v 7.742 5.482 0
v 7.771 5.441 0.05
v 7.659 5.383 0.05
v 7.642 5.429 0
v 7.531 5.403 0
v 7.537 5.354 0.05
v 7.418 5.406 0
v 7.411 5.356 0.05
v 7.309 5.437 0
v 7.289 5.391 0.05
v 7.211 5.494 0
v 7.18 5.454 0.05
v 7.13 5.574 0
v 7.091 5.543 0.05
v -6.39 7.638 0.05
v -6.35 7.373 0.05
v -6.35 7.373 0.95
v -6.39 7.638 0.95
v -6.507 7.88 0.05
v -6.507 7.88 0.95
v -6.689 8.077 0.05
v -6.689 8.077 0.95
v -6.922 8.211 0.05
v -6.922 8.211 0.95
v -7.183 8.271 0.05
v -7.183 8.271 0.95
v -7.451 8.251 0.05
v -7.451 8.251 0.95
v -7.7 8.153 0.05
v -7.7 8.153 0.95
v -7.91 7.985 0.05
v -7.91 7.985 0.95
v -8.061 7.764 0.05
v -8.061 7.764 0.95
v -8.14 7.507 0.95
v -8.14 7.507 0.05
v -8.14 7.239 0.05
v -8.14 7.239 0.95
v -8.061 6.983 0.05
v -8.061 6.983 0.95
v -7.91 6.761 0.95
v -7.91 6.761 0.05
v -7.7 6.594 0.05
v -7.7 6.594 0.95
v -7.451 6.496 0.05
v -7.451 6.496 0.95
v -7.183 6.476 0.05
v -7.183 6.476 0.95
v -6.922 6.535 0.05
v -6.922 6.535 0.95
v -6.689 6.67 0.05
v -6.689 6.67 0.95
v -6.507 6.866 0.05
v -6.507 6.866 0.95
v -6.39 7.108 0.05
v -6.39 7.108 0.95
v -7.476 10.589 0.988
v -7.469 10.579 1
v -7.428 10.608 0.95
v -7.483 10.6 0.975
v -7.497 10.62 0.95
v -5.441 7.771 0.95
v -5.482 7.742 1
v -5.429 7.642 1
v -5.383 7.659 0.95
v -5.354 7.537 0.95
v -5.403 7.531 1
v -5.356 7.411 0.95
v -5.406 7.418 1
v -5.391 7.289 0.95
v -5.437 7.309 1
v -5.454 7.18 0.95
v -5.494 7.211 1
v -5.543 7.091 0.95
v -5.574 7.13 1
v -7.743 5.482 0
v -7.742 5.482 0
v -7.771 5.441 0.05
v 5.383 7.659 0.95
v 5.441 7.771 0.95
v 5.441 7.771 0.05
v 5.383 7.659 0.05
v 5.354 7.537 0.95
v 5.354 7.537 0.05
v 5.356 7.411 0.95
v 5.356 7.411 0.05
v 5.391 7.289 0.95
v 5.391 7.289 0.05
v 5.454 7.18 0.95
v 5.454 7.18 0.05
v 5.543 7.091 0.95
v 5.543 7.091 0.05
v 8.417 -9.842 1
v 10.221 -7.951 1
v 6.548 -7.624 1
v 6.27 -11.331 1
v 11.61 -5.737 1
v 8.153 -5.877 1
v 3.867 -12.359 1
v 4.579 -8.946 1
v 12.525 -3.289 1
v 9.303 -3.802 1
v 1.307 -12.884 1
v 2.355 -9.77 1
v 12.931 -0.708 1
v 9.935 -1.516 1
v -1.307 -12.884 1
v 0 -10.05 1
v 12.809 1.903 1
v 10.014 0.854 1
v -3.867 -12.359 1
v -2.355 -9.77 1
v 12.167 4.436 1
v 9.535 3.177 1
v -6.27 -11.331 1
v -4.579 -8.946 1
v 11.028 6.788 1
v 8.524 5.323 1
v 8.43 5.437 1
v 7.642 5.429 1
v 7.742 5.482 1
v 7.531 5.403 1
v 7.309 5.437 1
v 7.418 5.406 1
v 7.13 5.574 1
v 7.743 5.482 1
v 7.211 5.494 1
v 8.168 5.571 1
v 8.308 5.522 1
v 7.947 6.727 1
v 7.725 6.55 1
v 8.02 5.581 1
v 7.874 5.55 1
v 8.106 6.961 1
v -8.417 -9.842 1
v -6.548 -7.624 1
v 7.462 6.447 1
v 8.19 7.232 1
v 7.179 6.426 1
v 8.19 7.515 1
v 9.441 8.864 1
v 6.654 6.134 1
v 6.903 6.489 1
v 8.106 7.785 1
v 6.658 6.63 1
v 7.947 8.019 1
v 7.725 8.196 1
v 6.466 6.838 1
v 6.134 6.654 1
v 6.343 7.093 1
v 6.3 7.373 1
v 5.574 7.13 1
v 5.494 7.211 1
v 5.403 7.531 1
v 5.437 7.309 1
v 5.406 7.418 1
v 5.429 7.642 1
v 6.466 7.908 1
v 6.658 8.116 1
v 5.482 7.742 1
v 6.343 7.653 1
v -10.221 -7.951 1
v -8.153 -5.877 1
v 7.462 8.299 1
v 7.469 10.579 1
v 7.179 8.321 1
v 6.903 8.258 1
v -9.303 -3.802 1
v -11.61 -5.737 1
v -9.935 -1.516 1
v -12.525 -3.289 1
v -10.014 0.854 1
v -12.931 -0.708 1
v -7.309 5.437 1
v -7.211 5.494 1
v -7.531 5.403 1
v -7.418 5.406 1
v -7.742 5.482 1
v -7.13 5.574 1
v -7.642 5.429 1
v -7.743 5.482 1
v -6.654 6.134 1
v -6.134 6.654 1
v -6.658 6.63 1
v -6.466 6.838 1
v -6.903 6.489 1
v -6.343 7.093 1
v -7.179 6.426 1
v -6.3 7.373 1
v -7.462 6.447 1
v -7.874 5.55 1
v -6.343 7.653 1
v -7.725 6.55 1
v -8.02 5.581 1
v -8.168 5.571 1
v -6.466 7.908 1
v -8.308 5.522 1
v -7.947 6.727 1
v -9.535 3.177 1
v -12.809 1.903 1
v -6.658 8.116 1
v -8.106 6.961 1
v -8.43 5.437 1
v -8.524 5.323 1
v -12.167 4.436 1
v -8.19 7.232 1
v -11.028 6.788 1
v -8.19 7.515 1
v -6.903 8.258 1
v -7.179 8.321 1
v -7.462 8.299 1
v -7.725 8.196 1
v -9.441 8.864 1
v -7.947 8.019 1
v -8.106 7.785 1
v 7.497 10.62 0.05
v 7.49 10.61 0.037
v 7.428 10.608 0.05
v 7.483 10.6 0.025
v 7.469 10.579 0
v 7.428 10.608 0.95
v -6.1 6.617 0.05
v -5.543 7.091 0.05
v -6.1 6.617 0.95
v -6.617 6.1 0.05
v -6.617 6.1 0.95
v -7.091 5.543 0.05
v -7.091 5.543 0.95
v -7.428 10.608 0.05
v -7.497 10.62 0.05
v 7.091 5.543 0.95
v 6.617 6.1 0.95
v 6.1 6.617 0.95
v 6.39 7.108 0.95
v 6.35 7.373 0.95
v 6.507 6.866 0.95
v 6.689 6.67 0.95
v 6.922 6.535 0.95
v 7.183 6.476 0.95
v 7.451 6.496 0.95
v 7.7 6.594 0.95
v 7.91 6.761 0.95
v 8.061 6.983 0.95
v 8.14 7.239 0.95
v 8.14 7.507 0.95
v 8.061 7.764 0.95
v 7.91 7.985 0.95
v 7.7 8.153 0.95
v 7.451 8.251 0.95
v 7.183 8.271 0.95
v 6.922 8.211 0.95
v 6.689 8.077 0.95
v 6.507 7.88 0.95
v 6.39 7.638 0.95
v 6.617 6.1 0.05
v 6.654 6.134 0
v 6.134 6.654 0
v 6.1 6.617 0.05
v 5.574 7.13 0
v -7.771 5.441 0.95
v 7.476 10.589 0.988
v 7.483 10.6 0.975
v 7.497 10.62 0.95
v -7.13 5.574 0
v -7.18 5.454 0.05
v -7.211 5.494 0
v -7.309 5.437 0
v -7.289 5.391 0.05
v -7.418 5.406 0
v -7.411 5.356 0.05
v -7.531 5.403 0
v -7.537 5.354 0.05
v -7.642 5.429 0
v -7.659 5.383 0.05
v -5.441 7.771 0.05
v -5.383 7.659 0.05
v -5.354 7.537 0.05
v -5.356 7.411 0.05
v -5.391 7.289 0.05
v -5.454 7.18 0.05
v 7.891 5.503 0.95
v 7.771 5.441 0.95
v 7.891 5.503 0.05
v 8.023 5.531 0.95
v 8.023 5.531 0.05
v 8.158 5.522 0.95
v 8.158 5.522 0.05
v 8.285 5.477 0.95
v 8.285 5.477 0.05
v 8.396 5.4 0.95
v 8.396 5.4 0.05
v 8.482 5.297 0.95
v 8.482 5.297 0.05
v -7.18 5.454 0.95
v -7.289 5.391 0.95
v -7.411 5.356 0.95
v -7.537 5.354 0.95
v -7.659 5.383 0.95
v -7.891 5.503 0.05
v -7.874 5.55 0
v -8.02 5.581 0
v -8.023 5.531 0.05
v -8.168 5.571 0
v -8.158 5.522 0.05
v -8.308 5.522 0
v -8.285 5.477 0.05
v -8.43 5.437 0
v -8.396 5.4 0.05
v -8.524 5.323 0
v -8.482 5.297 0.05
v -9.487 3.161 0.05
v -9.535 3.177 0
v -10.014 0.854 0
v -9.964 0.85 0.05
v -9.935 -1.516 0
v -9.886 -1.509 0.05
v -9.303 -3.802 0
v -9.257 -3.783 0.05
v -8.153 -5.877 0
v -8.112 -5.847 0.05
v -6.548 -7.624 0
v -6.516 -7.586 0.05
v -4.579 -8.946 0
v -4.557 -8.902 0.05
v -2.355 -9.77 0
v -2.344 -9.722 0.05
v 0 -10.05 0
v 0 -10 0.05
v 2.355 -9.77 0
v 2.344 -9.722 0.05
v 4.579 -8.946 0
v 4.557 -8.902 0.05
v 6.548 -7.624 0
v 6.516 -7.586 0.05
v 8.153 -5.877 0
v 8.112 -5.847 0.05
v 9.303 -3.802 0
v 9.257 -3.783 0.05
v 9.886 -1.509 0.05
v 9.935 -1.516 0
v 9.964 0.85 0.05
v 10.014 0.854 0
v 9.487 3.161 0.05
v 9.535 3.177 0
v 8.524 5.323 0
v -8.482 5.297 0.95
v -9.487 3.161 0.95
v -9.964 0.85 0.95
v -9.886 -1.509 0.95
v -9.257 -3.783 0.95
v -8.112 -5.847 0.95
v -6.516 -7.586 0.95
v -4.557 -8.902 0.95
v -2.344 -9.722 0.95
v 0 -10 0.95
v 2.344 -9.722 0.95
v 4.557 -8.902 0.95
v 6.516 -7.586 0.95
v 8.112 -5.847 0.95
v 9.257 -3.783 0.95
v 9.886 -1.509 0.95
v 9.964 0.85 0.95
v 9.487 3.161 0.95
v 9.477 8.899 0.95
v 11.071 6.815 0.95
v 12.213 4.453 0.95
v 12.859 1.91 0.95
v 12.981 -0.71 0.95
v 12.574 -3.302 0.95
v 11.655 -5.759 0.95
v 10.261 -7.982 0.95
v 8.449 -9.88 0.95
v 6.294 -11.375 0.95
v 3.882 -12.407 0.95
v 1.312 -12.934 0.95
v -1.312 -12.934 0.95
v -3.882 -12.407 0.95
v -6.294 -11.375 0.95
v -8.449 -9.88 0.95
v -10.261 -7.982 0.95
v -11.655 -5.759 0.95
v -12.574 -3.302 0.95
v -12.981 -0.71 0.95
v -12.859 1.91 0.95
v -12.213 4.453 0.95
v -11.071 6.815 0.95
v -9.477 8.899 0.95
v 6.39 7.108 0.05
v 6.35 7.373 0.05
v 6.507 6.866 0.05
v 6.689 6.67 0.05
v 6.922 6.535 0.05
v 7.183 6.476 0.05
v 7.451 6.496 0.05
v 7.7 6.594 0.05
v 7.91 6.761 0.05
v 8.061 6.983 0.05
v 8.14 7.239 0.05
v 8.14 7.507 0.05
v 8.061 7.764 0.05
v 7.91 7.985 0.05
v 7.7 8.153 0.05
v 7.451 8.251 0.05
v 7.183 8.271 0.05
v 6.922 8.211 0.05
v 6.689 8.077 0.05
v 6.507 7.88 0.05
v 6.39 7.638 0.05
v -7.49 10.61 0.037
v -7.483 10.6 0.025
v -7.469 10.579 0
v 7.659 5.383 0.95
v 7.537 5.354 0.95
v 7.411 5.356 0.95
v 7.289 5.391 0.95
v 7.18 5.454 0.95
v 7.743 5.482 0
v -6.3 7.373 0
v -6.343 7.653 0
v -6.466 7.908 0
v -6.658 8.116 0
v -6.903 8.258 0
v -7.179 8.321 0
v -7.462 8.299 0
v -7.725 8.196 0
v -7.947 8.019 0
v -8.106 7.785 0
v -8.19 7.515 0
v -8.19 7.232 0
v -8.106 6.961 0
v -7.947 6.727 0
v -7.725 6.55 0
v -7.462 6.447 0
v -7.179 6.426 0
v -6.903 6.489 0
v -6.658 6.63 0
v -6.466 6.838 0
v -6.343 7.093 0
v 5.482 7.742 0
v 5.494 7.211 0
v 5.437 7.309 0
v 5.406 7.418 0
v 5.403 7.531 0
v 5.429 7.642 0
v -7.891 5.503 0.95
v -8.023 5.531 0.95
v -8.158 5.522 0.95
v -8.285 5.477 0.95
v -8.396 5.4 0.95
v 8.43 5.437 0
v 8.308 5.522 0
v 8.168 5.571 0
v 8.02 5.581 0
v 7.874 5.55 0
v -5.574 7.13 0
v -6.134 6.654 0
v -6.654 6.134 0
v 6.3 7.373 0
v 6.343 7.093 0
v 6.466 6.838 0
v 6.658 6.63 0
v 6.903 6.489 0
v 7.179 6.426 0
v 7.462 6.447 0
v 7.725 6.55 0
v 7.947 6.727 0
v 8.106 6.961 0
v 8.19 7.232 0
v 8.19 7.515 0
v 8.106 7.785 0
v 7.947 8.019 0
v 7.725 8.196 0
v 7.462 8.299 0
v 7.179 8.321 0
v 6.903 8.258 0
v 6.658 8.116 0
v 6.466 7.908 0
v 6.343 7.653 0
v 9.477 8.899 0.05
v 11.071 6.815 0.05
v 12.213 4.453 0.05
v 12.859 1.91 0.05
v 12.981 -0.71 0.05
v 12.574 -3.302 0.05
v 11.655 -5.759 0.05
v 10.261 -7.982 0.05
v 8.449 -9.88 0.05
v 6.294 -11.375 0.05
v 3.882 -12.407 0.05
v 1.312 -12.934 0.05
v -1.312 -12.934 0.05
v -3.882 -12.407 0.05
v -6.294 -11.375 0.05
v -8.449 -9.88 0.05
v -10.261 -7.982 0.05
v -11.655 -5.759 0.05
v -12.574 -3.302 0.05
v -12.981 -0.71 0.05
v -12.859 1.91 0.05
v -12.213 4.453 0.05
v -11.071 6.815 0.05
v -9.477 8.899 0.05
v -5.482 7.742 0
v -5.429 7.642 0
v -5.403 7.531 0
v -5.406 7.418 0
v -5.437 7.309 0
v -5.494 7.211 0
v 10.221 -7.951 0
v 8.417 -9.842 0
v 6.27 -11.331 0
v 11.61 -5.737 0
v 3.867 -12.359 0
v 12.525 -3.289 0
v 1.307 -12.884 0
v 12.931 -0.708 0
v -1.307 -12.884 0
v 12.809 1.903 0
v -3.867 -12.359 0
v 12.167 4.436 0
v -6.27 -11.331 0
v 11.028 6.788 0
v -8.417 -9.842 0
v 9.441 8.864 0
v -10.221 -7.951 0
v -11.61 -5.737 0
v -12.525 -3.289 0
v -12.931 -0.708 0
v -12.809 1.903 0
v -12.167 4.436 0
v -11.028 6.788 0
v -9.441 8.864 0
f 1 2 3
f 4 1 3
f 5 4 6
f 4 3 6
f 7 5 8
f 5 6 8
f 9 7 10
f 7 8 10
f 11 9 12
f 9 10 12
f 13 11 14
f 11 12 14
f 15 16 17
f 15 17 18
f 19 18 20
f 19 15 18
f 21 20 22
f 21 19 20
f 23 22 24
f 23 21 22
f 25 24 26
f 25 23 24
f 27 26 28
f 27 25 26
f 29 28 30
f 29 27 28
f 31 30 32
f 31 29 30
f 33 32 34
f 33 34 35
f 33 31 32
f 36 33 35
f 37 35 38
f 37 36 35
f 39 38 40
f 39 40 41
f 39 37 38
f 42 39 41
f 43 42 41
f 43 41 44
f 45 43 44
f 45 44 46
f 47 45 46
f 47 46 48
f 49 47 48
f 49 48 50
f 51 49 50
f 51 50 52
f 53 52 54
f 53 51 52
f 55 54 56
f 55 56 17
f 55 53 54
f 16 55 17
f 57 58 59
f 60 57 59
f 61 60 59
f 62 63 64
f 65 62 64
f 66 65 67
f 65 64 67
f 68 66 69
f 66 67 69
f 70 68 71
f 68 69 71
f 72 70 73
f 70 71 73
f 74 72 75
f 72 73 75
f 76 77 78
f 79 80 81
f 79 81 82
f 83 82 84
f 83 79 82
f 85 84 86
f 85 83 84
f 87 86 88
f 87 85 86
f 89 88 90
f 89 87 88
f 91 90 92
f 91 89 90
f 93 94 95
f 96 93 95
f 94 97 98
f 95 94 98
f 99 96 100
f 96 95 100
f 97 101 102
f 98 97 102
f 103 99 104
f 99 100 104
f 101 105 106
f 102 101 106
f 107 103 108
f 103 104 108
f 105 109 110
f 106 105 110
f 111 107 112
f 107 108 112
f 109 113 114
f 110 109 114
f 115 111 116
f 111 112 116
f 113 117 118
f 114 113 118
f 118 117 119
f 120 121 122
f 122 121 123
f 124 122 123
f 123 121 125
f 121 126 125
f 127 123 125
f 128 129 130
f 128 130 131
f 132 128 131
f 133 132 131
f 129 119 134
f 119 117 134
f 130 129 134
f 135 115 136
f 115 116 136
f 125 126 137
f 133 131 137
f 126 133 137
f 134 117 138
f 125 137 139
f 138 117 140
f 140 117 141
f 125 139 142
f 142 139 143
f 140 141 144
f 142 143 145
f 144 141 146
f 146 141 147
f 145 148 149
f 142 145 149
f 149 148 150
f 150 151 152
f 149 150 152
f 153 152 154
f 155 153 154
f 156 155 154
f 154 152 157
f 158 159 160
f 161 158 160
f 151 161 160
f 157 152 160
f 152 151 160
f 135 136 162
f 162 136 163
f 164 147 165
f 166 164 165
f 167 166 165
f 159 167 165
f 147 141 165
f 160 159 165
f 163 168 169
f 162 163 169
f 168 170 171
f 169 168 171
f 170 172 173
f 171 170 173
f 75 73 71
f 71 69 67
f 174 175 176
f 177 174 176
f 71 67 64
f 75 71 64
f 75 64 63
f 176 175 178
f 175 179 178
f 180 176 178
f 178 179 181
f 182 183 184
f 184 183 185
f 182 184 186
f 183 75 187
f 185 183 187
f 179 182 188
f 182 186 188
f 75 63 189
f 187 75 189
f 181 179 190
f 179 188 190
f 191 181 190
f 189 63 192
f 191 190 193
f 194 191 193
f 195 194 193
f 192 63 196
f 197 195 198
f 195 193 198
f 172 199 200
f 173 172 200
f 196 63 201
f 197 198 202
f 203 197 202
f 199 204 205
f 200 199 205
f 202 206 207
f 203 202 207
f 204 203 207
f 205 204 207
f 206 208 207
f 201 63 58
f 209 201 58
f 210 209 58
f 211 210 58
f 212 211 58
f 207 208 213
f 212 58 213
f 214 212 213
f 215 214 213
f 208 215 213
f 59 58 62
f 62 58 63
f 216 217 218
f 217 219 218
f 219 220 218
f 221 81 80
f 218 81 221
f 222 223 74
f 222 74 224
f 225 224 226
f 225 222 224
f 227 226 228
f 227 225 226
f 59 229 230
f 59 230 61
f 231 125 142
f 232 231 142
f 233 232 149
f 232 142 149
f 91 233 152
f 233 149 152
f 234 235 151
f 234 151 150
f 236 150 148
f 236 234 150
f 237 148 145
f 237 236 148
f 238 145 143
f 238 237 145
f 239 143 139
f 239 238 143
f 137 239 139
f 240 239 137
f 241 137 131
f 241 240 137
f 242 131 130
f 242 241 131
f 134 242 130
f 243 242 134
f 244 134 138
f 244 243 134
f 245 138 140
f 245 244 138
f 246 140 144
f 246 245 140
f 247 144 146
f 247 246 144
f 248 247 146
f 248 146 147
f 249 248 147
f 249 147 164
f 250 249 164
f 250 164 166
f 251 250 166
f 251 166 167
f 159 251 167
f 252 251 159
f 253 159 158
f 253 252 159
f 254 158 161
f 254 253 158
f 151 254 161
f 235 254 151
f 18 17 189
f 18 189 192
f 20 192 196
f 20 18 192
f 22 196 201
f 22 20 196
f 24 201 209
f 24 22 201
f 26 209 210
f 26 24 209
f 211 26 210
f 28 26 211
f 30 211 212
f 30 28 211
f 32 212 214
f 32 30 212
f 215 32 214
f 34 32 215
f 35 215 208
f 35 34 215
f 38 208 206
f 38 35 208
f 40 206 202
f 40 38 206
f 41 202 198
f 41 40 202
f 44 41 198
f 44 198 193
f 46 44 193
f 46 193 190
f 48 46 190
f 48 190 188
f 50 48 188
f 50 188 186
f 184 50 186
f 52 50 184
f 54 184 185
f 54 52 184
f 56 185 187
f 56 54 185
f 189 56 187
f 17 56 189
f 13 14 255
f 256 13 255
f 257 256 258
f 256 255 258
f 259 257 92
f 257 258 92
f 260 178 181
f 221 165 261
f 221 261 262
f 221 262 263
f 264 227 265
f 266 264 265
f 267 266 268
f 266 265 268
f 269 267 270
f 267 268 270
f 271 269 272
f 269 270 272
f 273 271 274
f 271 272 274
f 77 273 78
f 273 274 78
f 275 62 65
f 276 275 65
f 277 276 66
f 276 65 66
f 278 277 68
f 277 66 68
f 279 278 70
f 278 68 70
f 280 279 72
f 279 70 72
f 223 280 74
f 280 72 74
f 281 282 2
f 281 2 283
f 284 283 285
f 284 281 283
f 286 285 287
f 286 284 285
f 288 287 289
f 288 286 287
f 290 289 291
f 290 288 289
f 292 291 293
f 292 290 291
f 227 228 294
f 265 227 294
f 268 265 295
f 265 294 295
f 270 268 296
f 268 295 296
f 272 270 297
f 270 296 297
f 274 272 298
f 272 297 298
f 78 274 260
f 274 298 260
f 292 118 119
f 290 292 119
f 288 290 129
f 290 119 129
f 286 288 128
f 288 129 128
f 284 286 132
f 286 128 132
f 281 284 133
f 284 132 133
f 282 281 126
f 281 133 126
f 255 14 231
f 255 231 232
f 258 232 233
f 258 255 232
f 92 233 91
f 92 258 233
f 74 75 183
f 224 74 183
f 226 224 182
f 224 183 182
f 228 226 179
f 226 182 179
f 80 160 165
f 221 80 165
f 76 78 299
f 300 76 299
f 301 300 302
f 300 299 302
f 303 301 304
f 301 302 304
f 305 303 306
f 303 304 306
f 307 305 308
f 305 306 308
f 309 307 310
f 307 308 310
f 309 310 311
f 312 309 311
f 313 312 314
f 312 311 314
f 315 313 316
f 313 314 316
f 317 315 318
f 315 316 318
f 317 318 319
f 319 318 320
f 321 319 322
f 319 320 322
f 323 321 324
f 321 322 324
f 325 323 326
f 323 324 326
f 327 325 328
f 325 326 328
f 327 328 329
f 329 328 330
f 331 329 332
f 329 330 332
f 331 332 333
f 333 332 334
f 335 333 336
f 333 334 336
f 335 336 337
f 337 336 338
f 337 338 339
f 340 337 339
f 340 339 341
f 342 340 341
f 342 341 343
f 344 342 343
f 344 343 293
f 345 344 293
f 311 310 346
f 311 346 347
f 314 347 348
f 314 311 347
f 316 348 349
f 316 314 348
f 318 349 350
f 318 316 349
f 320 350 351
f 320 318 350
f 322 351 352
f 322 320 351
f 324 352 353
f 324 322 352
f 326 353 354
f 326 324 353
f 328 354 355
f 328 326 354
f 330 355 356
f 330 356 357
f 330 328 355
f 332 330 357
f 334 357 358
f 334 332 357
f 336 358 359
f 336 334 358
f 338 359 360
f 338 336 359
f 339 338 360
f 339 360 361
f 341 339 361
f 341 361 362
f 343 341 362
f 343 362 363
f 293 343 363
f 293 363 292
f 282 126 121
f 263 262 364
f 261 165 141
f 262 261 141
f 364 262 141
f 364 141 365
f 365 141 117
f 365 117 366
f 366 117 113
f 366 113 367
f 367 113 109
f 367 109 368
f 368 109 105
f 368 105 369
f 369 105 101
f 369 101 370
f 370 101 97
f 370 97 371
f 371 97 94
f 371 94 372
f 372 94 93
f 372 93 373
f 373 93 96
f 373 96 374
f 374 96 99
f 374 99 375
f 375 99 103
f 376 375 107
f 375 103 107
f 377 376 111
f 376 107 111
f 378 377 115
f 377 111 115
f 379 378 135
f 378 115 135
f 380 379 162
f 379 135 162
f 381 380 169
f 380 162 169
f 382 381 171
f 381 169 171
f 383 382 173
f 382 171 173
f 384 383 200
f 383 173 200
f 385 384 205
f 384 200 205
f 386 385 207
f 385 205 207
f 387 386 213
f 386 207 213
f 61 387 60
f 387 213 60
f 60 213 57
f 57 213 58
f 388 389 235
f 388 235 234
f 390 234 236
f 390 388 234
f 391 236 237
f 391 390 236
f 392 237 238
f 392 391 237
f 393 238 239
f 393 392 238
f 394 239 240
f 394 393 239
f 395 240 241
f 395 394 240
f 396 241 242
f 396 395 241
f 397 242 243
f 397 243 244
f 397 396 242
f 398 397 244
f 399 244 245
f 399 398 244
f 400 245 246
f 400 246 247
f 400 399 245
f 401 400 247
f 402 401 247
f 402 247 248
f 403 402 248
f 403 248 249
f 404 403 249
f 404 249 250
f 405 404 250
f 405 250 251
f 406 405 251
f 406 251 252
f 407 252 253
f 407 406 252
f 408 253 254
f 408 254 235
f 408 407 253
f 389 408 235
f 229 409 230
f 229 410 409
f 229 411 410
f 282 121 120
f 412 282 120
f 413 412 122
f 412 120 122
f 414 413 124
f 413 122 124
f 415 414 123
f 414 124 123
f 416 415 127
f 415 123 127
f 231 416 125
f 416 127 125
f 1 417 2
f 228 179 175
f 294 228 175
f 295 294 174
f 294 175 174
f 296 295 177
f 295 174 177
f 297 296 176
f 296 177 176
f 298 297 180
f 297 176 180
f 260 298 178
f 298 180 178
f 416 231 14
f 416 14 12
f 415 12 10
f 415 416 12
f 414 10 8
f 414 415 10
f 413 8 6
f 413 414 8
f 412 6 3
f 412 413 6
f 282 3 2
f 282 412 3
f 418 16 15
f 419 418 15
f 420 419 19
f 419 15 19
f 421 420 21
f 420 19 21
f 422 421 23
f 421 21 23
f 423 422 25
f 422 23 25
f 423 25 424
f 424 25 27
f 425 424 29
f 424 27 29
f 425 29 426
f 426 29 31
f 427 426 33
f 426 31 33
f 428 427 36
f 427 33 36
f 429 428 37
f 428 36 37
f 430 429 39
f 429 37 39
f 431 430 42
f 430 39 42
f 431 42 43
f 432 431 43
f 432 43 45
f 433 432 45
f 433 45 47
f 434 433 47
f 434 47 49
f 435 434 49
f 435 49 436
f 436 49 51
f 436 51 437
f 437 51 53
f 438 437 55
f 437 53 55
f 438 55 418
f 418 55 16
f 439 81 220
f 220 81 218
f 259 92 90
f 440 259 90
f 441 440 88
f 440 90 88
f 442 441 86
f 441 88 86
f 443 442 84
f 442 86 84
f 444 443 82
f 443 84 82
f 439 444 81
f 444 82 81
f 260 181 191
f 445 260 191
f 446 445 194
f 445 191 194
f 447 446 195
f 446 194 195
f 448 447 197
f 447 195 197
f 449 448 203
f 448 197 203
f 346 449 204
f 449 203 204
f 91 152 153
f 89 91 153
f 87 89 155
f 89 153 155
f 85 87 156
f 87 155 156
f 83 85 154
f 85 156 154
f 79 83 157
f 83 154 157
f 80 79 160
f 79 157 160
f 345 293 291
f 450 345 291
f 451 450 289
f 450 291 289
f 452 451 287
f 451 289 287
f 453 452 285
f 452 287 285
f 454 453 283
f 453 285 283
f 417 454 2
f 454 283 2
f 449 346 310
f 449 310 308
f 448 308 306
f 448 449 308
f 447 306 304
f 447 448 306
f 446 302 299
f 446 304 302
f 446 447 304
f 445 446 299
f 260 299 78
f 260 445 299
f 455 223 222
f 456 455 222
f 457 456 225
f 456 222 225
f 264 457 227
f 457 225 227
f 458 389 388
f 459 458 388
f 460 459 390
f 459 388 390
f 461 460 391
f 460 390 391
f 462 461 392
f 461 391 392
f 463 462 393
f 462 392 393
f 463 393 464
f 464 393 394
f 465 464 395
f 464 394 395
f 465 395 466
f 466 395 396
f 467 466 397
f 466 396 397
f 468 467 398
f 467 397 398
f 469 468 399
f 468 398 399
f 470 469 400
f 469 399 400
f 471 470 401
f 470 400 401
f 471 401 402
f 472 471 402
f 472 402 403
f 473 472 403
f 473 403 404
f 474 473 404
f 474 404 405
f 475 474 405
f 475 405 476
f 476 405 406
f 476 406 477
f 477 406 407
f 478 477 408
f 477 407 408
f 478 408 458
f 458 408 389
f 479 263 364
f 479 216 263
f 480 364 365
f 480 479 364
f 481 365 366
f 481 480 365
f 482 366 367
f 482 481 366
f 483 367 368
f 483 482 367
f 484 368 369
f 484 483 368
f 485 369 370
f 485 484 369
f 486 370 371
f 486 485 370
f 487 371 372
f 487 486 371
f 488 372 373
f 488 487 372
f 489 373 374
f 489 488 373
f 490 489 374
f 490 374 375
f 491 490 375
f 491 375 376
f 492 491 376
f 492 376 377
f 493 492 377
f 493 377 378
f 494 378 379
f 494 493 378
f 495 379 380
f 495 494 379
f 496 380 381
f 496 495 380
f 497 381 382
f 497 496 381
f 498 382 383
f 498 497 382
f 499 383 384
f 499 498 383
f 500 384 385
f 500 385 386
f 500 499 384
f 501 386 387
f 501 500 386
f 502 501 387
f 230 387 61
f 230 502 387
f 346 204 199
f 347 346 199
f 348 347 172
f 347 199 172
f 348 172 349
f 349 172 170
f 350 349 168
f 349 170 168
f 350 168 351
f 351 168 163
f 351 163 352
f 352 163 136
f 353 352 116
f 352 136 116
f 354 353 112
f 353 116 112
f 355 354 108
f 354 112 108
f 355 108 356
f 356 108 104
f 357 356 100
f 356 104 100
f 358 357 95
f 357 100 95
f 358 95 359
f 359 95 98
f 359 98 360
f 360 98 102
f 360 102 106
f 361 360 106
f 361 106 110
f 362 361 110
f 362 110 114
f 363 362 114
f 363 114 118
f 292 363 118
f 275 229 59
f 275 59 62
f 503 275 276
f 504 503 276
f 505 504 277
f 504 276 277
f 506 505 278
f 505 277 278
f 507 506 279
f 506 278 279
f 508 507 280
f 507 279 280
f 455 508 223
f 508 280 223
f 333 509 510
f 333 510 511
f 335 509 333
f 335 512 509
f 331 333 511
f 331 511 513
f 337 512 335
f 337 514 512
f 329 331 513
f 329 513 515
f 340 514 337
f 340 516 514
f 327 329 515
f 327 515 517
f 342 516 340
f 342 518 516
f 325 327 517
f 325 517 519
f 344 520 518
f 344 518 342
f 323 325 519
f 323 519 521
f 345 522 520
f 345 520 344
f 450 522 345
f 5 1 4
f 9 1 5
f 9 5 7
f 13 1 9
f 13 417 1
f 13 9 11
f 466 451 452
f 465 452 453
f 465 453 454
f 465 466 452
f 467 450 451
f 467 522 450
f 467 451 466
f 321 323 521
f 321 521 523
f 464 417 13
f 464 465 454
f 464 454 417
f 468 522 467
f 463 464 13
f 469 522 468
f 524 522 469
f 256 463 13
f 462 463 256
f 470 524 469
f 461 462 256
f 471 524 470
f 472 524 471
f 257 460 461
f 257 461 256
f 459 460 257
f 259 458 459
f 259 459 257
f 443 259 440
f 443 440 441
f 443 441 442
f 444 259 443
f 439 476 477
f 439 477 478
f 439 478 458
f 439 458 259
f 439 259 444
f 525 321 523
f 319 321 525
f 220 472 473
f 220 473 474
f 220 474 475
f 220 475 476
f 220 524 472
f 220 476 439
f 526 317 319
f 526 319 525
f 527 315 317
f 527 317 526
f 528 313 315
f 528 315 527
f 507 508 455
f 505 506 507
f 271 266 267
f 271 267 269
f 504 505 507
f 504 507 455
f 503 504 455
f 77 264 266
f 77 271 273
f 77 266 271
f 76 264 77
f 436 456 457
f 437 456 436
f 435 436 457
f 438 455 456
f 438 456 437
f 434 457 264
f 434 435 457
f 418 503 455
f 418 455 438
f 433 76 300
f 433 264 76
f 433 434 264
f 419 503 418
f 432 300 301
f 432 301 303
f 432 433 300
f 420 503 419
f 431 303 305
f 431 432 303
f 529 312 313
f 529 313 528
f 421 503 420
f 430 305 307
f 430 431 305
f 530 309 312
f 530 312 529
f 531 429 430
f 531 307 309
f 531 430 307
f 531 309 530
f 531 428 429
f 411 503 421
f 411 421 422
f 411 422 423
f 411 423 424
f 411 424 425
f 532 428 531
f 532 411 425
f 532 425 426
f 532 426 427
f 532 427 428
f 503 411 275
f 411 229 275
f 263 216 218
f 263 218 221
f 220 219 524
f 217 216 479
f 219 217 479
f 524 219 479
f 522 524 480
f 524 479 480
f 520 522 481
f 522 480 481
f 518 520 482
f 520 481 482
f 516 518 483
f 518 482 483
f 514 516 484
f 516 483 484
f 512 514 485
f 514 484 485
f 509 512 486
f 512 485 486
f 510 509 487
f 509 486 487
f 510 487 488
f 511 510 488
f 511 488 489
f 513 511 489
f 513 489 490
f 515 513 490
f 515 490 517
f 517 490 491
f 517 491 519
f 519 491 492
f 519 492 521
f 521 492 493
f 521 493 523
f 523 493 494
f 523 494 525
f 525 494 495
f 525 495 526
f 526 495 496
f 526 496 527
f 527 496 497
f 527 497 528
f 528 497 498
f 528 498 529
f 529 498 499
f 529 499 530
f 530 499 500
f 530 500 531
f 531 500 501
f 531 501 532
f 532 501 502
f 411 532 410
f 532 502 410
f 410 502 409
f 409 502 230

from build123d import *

# Parameters (mm, degrees)
SCHIZZO1_R                   = 0.9
ESTRUSIONE_ESTRUSIONE1_DEPTH = 1
RACCORDO2_R                  = 0.5
SMUSSO2_SIZE                 = 0.05


with BuildPart() as part:
    # Schizzo1 → Estrusione-Estrusione1 (new body)
    with BuildSketch(Plane.XY):
        with BuildLine():
            Line((5.162187927, 7.372368399), (7.456493673, 10.648976576))
            ThreePointArc((7.456493673, 10.648976576), (0, -13), (-7.456493673, 10.648976576))
            Line((-7.456493673, 10.648976576), (-5.162187927, 7.372368399))
            ThreePointArc((-5.162187927, 7.372368399), (-6.363961031, 6.363961031), (-7.372368399, 5.162187927))
            Line((-7.372368399, 5.162187927), (-8.191520443, 5.735764364))
            ThreePointArc((-8.191520443, 5.735764364), (0, -10), (8.191520443, 5.735764364))
            Line((8.191520443, 5.735764364), (7.372368399, 5.162187927))
            ThreePointArc((7.372368399, 5.162187927), (6.363961031, 6.363961031), (5.162187927, 7.372368399))
        make_face()
        with Locations((-7.250430621, 7.373218425)):
            Circle(SCHIZZO1_R, mode=Mode.SUBTRACT)
        with Locations(Location((7.250430621, 7.373218425, 0), (0, 0, 180))):
            Circle(SCHIZZO1_R, mode=Mode.SUBTRACT)
    extrude(amount=ESTRUSIONE_ESTRUSIONE1_DEPTH)

    # Raccordo2
    raccordo2_edges = [part.edges().sort_by_distance(p)[0] for p in [
        (5.162187927, 7.372368399, 0.5),
        (7.372368399, 5.162187927, 0.5),
        (8.191520443, 5.735764364, 0.5),
        (-5.162187927, 7.372368399, 0.5),
        (-7.372368399, 5.162187927, 0.5),
        (-8.191520443, 5.735764364, 0.5),
    ]]
    fillet(raccordo2_edges, radius=RACCORDO2_R - 0.0001)  # a hair under: the kernel refuses the full size

    # Smusso2
    smusso2_edges = [part.edges().sort_by_distance(p)[0] for p in [
        (0, -13, 1),
        (6.448931556, 9.210028747, 1),
        (7.456493673, 10.648976576, 0.5),
        (-7.456493673, 10.648976576, 0.5),
        (-8.150430621, 7.373218425, 0),
        (-8.150430621, 7.373218425, 1),
        (8.150430621, 7.373218425, 0),
        (8.150430621, 7.373218425, 1),
        (6.363961031, 6.363961031, 0),
        (6.363961031, 6.363961031, 1),
        (-6.363961031, 6.363961031, 0),
        (0, -10, 0),
        (-6.448931556, 9.210028747, 0),
        (-7.410530845, 5.356443953, 0),
        (-5.356443953, 7.410530845, 0),
        (7.410530845, 5.356443953, 0),
        (5.356443953, 7.410530845, 0),
        (-6.363961031, 6.363961031, 1),
        (-6.448931556, 9.210028747, 1),
        (0, -10, 1),
        (-7.410530845, 5.356443953, 1),
        (-5.356443953, 7.410530845, 1),
        (7.410530845, 5.356443953, 1),
        (5.356443953, 7.410530845, 1),
        (8.157709655, 5.521840362, 0),
        (8.157709655, 5.521840362, 1),
        (-8.157709655, 5.521840362, 0),
        (-8.157709655, 5.521840362, 1),
        (6.448931556, 9.210028747, 0),
        (0, -13, 0),
    ]]
    chamfer(smusso2_edges, length=SMUSSO2_SIZE)


solid = part.part
